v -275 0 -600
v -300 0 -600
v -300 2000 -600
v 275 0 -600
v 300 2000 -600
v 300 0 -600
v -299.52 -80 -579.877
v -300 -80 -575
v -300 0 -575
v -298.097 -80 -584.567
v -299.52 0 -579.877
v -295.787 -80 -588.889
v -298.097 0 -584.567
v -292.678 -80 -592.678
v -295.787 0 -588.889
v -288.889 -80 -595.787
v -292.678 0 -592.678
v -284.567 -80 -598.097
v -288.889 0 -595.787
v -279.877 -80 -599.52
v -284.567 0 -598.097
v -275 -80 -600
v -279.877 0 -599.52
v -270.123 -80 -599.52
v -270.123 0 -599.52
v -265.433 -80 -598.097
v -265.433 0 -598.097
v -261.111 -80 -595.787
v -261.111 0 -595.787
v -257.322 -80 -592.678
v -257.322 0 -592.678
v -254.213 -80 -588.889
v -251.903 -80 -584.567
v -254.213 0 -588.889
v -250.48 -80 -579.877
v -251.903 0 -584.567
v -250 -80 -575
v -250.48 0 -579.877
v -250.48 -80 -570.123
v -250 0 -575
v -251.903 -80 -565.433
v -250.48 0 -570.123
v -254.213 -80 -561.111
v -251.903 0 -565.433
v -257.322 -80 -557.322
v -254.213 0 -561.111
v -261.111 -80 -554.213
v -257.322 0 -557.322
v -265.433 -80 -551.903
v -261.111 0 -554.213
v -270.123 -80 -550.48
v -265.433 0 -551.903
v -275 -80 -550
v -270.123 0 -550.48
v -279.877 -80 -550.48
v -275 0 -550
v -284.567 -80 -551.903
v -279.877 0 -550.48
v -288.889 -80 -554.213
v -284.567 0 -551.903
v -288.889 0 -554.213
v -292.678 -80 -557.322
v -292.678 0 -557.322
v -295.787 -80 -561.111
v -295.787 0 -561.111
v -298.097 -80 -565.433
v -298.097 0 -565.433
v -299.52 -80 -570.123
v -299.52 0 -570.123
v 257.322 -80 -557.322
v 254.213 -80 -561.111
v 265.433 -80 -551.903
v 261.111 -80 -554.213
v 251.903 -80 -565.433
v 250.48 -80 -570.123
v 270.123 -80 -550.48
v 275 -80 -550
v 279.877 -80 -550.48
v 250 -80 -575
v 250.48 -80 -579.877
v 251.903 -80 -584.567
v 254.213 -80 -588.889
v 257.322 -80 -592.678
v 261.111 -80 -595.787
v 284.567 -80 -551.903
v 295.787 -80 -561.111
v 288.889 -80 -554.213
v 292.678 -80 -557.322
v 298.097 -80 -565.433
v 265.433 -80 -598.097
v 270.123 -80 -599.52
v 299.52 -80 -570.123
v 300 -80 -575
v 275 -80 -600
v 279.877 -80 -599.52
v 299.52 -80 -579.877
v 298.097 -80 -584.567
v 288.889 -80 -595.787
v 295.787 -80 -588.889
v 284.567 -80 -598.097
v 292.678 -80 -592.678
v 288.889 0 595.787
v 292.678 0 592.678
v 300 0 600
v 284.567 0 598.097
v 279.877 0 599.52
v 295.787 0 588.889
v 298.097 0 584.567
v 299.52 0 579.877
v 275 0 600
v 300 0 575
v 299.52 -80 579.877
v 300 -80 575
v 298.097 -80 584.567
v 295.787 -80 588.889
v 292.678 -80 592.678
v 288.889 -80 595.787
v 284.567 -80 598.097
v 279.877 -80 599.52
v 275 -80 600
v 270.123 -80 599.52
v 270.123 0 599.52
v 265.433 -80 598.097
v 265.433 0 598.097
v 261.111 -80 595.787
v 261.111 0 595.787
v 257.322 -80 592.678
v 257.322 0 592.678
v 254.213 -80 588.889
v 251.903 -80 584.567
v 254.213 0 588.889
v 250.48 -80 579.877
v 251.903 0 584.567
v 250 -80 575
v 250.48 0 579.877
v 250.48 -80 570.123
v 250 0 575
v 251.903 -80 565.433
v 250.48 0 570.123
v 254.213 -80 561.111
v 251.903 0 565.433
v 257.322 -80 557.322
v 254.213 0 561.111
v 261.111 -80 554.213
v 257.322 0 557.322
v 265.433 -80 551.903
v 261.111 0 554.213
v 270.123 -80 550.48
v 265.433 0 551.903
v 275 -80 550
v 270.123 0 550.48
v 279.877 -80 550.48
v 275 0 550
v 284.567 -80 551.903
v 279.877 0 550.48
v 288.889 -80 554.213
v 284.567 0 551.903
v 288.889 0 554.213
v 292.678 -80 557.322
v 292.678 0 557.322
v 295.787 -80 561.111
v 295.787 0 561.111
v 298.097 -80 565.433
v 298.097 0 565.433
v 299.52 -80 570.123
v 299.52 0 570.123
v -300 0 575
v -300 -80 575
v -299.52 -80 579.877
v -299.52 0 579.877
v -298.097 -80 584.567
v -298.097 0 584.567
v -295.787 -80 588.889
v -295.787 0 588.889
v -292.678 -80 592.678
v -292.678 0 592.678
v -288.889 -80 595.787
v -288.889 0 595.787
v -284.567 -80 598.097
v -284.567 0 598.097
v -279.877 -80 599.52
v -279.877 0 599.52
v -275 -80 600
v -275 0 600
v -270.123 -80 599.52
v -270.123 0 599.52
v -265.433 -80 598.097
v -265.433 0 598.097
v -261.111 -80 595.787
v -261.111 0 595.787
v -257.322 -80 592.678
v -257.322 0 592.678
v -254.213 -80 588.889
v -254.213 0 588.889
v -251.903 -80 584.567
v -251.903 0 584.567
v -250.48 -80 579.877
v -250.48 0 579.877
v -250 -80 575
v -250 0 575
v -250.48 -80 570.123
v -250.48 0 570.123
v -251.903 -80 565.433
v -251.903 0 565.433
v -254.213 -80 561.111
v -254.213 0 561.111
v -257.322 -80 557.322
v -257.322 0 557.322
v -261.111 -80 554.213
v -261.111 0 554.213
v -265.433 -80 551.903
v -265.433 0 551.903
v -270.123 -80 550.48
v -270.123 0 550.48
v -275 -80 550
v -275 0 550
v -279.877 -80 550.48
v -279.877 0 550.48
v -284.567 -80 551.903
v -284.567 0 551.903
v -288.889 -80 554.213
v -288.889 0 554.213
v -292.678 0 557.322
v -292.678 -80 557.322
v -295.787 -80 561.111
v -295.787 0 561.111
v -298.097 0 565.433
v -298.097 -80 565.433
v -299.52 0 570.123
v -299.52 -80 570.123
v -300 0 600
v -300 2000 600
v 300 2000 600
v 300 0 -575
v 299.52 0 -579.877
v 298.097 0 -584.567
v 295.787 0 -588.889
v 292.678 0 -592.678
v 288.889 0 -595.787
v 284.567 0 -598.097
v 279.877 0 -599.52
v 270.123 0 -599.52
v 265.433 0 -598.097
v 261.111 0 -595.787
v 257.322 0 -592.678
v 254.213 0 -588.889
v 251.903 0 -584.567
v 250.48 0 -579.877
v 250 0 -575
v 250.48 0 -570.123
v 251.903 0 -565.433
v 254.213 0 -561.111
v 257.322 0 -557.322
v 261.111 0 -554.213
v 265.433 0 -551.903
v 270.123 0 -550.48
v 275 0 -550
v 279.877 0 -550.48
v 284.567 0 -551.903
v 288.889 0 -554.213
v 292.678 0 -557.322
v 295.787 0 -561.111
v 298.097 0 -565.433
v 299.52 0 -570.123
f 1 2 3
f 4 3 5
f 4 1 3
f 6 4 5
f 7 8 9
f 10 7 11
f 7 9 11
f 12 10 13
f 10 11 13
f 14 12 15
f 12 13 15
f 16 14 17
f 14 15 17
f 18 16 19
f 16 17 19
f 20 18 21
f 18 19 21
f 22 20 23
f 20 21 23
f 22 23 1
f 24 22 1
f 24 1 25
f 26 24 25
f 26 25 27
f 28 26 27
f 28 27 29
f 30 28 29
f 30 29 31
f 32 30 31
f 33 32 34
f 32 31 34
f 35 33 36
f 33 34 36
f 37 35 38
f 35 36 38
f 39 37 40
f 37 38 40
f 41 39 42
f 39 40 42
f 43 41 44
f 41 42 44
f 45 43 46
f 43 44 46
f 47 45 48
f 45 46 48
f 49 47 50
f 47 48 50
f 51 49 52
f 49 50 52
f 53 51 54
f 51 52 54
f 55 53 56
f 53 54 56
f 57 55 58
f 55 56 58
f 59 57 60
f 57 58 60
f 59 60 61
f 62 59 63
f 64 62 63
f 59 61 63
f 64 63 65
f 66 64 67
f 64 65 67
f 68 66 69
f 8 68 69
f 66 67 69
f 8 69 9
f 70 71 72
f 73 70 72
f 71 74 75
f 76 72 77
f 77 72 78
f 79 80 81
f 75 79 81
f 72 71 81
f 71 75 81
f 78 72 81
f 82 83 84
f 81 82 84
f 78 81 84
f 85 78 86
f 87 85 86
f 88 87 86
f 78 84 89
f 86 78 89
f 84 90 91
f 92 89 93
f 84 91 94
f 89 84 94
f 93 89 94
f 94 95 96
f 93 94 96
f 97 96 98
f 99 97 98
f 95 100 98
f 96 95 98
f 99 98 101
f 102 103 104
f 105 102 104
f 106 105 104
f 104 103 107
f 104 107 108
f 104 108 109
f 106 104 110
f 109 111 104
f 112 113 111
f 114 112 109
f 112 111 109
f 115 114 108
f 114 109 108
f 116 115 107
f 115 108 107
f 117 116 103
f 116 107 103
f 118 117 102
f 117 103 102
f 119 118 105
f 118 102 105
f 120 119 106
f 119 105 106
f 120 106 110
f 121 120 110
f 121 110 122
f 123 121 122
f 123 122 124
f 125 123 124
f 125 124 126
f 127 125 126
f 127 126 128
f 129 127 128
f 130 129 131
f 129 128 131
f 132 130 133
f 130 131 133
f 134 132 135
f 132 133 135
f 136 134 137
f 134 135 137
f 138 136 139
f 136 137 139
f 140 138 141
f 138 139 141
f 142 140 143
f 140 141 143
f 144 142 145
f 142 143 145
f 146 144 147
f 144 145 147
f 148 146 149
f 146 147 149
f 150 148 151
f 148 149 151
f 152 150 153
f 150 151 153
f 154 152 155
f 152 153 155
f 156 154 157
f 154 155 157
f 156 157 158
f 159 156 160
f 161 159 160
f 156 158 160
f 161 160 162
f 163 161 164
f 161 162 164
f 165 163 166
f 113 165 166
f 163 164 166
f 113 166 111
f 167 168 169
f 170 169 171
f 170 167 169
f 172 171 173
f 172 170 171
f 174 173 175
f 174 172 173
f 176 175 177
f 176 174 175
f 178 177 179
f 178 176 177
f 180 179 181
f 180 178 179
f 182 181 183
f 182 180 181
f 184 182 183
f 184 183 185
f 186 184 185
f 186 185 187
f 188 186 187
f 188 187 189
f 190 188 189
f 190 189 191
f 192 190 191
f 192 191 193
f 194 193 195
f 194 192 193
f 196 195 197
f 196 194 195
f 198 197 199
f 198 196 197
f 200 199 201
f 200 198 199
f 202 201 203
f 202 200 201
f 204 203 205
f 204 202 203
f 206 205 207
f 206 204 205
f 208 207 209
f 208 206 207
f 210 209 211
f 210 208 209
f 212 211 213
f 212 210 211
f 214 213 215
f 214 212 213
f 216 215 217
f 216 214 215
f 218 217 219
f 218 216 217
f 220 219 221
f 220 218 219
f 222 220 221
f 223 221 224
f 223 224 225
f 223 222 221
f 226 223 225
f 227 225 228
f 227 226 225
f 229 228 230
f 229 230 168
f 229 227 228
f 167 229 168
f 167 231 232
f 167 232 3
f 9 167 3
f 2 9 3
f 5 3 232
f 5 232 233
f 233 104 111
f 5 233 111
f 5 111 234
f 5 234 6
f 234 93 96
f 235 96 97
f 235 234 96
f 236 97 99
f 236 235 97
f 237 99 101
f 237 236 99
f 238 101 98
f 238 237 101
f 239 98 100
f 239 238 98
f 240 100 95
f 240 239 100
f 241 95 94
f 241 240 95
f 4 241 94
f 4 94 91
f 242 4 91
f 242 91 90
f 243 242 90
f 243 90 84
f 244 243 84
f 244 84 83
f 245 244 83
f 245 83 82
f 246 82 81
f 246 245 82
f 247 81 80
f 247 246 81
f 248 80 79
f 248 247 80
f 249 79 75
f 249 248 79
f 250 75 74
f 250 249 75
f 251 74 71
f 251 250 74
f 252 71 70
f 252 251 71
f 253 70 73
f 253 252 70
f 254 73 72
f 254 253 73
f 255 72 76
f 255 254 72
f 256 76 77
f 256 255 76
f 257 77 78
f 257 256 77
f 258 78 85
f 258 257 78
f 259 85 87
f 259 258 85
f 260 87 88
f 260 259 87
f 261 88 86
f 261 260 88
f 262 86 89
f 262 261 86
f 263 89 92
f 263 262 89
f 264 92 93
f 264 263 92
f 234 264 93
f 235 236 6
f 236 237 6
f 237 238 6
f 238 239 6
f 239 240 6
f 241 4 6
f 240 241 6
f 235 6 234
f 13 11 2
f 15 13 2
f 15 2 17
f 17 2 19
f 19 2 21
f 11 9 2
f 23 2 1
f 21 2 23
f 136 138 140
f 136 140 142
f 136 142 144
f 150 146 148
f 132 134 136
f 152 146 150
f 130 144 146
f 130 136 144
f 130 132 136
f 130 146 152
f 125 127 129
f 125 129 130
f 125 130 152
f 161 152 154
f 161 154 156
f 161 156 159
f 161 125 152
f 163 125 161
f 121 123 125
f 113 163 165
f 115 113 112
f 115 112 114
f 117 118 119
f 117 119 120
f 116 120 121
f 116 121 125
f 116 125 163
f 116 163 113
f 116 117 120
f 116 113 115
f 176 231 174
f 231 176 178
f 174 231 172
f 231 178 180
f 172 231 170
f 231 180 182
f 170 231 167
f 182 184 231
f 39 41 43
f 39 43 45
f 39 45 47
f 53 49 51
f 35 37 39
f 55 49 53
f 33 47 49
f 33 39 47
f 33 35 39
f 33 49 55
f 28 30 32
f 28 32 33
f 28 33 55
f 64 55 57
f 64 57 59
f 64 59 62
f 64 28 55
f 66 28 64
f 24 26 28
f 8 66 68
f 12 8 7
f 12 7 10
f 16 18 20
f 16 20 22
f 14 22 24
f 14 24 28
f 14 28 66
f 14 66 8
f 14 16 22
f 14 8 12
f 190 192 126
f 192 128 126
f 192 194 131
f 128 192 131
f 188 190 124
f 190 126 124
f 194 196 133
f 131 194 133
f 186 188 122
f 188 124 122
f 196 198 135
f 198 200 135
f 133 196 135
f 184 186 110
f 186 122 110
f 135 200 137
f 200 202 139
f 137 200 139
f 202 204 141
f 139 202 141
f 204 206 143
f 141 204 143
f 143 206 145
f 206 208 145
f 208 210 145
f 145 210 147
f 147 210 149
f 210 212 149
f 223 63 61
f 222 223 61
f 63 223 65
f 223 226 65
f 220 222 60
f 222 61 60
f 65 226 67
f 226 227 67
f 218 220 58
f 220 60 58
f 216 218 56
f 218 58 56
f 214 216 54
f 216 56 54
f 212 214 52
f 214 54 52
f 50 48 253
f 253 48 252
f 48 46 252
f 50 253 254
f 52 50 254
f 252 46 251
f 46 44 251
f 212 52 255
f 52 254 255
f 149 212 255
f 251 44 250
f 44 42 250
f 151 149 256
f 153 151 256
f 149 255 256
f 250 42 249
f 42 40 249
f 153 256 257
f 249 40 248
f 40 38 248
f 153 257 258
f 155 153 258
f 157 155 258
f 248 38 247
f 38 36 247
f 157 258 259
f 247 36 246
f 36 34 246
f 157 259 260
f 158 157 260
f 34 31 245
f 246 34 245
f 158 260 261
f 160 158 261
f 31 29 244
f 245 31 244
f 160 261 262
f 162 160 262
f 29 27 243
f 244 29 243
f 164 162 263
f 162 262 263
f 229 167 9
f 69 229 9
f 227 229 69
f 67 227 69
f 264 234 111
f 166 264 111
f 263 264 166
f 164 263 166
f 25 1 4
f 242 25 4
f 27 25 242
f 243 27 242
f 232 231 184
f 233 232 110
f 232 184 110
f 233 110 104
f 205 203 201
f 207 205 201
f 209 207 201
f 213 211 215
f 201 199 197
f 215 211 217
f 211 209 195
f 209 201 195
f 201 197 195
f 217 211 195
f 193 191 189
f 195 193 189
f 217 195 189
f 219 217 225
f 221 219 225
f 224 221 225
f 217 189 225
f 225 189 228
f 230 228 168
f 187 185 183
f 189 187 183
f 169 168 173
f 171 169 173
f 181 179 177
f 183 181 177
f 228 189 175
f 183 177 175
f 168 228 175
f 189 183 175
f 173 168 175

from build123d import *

# Parameters (mm, degrees)
SKETCH_1_W               = 600
SKETCH_1_H               = 1200
EXTRUDE_1_DEPTH          = 2000
SKETCH_2_R               = 25
EXTRUDE_2_DEPTH          = 80
MIRROR_2_COPY_1_SKETCH_R = 25
MIRROR_2_COPY_1_DEPTH    = 80


with BuildPart() as part:
    # 草图1 → 凸台-拉伸1 (new body)
    with BuildSketch(Plane(origin=(0, 0, 0), x_dir=(1, 0, 0), z_dir=(0, 1, 0))):
        Rectangle(SKETCH_1_W, SKETCH_1_H)
    extrude(amount=EXTRUDE_1_DEPTH)

    # 草图2 → 凸台-拉伸2 (add)
    with BuildSketch(Plane.XZ):
        with Locations((275, 575)):
            Circle(SKETCH_2_R)
    extrude_2 = extrude(amount=EXTRUDE_2_DEPTH)

    # 镜向1: 凸台-拉伸2 across plane
    add(extrude_2.mirror(Plane(origin=(0, 0, 0), x_dir=(0, 0, 1), z_dir=(1, 0, 0))))

    # 镜向2: 凸台-拉伸2 across plane
    add(extrude_2.mirror(Plane.XY))

    # 镜向2 copy 1 sketch → 镜向2 copy 1 (add)
    with BuildSketch(Plane(origin=(0, 0, 0), x_dir=(-1, 0, 0), z_dir=(0, -1, 0))):
        with Locations((275, 575)):
            Circle(MIRROR_2_COPY_1_SKETCH_R)
    extrude(amount=MIRROR_2_COPY_1_DEPTH)


solid = part.part
